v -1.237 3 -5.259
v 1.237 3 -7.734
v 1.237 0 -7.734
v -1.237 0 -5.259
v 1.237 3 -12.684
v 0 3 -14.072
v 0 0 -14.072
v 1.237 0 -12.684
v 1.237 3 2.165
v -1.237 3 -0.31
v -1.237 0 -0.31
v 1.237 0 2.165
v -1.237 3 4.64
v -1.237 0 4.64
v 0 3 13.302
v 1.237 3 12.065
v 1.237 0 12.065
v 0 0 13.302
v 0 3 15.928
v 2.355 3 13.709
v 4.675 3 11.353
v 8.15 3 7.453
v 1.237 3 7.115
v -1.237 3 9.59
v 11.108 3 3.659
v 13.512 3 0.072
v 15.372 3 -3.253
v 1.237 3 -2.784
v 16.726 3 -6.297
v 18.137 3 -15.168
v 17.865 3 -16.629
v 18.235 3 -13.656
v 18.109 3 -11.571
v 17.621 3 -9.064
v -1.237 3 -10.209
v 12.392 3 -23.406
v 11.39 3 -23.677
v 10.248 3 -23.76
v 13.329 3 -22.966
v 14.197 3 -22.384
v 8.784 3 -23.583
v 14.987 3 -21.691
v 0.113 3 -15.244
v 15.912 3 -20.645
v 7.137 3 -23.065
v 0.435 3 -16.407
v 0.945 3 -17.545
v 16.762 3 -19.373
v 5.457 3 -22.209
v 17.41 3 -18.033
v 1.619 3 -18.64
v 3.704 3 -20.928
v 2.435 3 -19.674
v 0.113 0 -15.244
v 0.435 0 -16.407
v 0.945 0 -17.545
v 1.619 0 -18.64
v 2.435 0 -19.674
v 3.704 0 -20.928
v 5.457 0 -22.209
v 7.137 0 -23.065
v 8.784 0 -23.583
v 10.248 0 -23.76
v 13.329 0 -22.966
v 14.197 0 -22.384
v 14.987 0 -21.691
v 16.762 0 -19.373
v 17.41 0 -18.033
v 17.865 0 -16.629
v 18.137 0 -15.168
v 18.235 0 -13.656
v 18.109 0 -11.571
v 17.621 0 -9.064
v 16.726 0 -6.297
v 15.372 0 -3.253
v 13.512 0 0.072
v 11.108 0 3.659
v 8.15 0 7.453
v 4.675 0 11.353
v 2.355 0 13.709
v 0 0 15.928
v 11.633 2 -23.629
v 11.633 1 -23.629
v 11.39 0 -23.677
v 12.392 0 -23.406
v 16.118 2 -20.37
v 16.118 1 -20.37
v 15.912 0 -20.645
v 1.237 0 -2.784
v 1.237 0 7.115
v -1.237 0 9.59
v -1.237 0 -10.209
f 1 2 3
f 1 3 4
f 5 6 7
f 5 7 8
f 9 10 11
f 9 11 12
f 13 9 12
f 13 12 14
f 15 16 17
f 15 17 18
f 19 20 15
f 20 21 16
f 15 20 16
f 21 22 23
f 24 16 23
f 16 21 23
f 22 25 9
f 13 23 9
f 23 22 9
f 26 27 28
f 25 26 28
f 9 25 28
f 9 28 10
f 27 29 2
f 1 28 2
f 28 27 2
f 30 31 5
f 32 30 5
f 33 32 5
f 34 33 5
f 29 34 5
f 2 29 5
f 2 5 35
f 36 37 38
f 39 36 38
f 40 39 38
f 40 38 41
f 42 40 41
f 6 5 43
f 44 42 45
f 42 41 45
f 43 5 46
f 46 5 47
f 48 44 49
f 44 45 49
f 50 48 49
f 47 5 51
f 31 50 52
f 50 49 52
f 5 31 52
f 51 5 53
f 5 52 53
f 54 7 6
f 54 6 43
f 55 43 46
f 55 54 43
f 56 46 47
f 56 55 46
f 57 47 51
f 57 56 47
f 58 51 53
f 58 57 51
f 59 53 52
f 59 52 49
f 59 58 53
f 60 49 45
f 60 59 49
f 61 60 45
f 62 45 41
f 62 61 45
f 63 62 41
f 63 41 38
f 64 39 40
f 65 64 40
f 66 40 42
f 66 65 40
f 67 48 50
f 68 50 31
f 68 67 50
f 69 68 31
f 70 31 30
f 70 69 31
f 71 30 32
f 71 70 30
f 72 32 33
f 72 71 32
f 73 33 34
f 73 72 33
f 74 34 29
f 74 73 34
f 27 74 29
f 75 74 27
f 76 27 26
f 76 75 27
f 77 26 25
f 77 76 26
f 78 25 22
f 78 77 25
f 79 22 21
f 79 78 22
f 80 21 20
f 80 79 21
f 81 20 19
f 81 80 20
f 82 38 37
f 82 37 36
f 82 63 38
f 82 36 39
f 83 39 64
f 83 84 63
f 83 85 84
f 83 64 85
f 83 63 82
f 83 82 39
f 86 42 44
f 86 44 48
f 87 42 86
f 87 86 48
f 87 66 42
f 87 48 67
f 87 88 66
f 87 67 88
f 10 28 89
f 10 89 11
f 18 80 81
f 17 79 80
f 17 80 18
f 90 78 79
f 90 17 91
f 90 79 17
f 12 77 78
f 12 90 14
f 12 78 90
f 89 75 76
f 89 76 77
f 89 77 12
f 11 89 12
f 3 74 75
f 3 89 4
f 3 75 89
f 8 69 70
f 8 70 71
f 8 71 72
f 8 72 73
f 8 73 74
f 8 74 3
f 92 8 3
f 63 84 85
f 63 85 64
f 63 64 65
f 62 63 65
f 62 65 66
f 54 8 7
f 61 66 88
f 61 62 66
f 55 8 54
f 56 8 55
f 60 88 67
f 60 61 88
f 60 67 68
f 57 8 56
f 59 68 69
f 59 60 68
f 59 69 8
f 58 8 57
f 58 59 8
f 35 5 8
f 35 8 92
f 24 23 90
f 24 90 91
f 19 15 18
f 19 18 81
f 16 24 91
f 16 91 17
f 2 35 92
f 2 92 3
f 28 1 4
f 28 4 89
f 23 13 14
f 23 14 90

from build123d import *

# Parameters (mm, degrees)
BOSS_EXTRUDE1_DEPTH = 3
CUT_EXTRUDE1_DEPTH  = 3


with BuildPart() as part:
    # Sketch1 → Boss-Extrude1 (new body)
    with BuildSketch(Plane(origin=(0, 0, 0), x_dir=(1, 0, 0), z_dir=(0, 1, 0))):
        with BuildLine():
            add(Edge.make_bspline(
                [(0, 14.072144476), (0, 19.244859197), (9.420520606, 26.756374749), (24.913753139, 13.272155804), (11.532977672, -5.454623459), (0, -15.927855524)],
                knots=[0, 0, 0, 0, 0.261667034, 0.361667034, 1, 1, 1, 1], degree=3))
            add(Edge.make_bspline(
                [(0, 14.072144476), (0, 19.244859197), (-9.420520606, 26.756374749), (-24.913753139, 13.272155804), (-11.532977672, -5.454623459), (0, -15.927855524)],
                knots=[0, 0, 0, 0, 0.261667034, 0.361667034, 1, 1, 1, 1], degree=3))
        make_face()
    extrude(amount=BOSS_EXTRUDE1_DEPTH)

    # Sketch3 → Cut-Extrude1 (cut)
    with BuildSketch(Plane(origin=(0, 3, 0), x_dir=(1, 0, 0), z_dir=(0, 1, 0))):
        with BuildLine():
            Line((0, 14.072144476), (1.237436867, 12.683950014))
            Line((1.237436867, 12.683950014), (-1.237436867, 10.20907628))
            Line((-1.237436867, 10.20907628), (1.237436867, 7.734202545))
            Line((1.237436867, 7.734202545), (-1.237436867, 5.259328811))
            Line((-1.237436867, 5.259328811), (1.237436867, 2.784455077))
            Line((1.237436867, 2.784455077), (-1.237436867, 0.309581343))
            Line((-1.237436867, 0.309581343), (1.237436867, -2.165292391))
            Line((1.237436867, -2.165292391), (-1.237436867, -4.640166125))
            Line((-1.237436867, -4.640166125), (1.237436867, -7.11503986))
            Line((1.237436867, -7.11503986), (-1.237436867, -9.589913594))
            Line((-1.237436867, -9.589913594), (1.237436867, -12.064787328))
            Line((1.237436867, -12.064787328), (0, -13.302224195))
            Line((0, -13.302224195), (0, -15.927855524))
            add(Edge.make_bspline(
                [(0, 14.072144476), (0, 19.244859197), (-9.420520606, 26.756374749), (-24.913753139, 13.272155804), (-11.532977672, -5.454623459), (0, -15.927855524)],
                knots=[0, 0, 0, 0, 0.261667034, 0.361667034, 1, 1, 1, 1], degree=3))
        make_face()
    extrude(amount=-CUT_EXTRUDE1_DEPTH, mode=Mode.SUBTRACT)


solid = part.part
